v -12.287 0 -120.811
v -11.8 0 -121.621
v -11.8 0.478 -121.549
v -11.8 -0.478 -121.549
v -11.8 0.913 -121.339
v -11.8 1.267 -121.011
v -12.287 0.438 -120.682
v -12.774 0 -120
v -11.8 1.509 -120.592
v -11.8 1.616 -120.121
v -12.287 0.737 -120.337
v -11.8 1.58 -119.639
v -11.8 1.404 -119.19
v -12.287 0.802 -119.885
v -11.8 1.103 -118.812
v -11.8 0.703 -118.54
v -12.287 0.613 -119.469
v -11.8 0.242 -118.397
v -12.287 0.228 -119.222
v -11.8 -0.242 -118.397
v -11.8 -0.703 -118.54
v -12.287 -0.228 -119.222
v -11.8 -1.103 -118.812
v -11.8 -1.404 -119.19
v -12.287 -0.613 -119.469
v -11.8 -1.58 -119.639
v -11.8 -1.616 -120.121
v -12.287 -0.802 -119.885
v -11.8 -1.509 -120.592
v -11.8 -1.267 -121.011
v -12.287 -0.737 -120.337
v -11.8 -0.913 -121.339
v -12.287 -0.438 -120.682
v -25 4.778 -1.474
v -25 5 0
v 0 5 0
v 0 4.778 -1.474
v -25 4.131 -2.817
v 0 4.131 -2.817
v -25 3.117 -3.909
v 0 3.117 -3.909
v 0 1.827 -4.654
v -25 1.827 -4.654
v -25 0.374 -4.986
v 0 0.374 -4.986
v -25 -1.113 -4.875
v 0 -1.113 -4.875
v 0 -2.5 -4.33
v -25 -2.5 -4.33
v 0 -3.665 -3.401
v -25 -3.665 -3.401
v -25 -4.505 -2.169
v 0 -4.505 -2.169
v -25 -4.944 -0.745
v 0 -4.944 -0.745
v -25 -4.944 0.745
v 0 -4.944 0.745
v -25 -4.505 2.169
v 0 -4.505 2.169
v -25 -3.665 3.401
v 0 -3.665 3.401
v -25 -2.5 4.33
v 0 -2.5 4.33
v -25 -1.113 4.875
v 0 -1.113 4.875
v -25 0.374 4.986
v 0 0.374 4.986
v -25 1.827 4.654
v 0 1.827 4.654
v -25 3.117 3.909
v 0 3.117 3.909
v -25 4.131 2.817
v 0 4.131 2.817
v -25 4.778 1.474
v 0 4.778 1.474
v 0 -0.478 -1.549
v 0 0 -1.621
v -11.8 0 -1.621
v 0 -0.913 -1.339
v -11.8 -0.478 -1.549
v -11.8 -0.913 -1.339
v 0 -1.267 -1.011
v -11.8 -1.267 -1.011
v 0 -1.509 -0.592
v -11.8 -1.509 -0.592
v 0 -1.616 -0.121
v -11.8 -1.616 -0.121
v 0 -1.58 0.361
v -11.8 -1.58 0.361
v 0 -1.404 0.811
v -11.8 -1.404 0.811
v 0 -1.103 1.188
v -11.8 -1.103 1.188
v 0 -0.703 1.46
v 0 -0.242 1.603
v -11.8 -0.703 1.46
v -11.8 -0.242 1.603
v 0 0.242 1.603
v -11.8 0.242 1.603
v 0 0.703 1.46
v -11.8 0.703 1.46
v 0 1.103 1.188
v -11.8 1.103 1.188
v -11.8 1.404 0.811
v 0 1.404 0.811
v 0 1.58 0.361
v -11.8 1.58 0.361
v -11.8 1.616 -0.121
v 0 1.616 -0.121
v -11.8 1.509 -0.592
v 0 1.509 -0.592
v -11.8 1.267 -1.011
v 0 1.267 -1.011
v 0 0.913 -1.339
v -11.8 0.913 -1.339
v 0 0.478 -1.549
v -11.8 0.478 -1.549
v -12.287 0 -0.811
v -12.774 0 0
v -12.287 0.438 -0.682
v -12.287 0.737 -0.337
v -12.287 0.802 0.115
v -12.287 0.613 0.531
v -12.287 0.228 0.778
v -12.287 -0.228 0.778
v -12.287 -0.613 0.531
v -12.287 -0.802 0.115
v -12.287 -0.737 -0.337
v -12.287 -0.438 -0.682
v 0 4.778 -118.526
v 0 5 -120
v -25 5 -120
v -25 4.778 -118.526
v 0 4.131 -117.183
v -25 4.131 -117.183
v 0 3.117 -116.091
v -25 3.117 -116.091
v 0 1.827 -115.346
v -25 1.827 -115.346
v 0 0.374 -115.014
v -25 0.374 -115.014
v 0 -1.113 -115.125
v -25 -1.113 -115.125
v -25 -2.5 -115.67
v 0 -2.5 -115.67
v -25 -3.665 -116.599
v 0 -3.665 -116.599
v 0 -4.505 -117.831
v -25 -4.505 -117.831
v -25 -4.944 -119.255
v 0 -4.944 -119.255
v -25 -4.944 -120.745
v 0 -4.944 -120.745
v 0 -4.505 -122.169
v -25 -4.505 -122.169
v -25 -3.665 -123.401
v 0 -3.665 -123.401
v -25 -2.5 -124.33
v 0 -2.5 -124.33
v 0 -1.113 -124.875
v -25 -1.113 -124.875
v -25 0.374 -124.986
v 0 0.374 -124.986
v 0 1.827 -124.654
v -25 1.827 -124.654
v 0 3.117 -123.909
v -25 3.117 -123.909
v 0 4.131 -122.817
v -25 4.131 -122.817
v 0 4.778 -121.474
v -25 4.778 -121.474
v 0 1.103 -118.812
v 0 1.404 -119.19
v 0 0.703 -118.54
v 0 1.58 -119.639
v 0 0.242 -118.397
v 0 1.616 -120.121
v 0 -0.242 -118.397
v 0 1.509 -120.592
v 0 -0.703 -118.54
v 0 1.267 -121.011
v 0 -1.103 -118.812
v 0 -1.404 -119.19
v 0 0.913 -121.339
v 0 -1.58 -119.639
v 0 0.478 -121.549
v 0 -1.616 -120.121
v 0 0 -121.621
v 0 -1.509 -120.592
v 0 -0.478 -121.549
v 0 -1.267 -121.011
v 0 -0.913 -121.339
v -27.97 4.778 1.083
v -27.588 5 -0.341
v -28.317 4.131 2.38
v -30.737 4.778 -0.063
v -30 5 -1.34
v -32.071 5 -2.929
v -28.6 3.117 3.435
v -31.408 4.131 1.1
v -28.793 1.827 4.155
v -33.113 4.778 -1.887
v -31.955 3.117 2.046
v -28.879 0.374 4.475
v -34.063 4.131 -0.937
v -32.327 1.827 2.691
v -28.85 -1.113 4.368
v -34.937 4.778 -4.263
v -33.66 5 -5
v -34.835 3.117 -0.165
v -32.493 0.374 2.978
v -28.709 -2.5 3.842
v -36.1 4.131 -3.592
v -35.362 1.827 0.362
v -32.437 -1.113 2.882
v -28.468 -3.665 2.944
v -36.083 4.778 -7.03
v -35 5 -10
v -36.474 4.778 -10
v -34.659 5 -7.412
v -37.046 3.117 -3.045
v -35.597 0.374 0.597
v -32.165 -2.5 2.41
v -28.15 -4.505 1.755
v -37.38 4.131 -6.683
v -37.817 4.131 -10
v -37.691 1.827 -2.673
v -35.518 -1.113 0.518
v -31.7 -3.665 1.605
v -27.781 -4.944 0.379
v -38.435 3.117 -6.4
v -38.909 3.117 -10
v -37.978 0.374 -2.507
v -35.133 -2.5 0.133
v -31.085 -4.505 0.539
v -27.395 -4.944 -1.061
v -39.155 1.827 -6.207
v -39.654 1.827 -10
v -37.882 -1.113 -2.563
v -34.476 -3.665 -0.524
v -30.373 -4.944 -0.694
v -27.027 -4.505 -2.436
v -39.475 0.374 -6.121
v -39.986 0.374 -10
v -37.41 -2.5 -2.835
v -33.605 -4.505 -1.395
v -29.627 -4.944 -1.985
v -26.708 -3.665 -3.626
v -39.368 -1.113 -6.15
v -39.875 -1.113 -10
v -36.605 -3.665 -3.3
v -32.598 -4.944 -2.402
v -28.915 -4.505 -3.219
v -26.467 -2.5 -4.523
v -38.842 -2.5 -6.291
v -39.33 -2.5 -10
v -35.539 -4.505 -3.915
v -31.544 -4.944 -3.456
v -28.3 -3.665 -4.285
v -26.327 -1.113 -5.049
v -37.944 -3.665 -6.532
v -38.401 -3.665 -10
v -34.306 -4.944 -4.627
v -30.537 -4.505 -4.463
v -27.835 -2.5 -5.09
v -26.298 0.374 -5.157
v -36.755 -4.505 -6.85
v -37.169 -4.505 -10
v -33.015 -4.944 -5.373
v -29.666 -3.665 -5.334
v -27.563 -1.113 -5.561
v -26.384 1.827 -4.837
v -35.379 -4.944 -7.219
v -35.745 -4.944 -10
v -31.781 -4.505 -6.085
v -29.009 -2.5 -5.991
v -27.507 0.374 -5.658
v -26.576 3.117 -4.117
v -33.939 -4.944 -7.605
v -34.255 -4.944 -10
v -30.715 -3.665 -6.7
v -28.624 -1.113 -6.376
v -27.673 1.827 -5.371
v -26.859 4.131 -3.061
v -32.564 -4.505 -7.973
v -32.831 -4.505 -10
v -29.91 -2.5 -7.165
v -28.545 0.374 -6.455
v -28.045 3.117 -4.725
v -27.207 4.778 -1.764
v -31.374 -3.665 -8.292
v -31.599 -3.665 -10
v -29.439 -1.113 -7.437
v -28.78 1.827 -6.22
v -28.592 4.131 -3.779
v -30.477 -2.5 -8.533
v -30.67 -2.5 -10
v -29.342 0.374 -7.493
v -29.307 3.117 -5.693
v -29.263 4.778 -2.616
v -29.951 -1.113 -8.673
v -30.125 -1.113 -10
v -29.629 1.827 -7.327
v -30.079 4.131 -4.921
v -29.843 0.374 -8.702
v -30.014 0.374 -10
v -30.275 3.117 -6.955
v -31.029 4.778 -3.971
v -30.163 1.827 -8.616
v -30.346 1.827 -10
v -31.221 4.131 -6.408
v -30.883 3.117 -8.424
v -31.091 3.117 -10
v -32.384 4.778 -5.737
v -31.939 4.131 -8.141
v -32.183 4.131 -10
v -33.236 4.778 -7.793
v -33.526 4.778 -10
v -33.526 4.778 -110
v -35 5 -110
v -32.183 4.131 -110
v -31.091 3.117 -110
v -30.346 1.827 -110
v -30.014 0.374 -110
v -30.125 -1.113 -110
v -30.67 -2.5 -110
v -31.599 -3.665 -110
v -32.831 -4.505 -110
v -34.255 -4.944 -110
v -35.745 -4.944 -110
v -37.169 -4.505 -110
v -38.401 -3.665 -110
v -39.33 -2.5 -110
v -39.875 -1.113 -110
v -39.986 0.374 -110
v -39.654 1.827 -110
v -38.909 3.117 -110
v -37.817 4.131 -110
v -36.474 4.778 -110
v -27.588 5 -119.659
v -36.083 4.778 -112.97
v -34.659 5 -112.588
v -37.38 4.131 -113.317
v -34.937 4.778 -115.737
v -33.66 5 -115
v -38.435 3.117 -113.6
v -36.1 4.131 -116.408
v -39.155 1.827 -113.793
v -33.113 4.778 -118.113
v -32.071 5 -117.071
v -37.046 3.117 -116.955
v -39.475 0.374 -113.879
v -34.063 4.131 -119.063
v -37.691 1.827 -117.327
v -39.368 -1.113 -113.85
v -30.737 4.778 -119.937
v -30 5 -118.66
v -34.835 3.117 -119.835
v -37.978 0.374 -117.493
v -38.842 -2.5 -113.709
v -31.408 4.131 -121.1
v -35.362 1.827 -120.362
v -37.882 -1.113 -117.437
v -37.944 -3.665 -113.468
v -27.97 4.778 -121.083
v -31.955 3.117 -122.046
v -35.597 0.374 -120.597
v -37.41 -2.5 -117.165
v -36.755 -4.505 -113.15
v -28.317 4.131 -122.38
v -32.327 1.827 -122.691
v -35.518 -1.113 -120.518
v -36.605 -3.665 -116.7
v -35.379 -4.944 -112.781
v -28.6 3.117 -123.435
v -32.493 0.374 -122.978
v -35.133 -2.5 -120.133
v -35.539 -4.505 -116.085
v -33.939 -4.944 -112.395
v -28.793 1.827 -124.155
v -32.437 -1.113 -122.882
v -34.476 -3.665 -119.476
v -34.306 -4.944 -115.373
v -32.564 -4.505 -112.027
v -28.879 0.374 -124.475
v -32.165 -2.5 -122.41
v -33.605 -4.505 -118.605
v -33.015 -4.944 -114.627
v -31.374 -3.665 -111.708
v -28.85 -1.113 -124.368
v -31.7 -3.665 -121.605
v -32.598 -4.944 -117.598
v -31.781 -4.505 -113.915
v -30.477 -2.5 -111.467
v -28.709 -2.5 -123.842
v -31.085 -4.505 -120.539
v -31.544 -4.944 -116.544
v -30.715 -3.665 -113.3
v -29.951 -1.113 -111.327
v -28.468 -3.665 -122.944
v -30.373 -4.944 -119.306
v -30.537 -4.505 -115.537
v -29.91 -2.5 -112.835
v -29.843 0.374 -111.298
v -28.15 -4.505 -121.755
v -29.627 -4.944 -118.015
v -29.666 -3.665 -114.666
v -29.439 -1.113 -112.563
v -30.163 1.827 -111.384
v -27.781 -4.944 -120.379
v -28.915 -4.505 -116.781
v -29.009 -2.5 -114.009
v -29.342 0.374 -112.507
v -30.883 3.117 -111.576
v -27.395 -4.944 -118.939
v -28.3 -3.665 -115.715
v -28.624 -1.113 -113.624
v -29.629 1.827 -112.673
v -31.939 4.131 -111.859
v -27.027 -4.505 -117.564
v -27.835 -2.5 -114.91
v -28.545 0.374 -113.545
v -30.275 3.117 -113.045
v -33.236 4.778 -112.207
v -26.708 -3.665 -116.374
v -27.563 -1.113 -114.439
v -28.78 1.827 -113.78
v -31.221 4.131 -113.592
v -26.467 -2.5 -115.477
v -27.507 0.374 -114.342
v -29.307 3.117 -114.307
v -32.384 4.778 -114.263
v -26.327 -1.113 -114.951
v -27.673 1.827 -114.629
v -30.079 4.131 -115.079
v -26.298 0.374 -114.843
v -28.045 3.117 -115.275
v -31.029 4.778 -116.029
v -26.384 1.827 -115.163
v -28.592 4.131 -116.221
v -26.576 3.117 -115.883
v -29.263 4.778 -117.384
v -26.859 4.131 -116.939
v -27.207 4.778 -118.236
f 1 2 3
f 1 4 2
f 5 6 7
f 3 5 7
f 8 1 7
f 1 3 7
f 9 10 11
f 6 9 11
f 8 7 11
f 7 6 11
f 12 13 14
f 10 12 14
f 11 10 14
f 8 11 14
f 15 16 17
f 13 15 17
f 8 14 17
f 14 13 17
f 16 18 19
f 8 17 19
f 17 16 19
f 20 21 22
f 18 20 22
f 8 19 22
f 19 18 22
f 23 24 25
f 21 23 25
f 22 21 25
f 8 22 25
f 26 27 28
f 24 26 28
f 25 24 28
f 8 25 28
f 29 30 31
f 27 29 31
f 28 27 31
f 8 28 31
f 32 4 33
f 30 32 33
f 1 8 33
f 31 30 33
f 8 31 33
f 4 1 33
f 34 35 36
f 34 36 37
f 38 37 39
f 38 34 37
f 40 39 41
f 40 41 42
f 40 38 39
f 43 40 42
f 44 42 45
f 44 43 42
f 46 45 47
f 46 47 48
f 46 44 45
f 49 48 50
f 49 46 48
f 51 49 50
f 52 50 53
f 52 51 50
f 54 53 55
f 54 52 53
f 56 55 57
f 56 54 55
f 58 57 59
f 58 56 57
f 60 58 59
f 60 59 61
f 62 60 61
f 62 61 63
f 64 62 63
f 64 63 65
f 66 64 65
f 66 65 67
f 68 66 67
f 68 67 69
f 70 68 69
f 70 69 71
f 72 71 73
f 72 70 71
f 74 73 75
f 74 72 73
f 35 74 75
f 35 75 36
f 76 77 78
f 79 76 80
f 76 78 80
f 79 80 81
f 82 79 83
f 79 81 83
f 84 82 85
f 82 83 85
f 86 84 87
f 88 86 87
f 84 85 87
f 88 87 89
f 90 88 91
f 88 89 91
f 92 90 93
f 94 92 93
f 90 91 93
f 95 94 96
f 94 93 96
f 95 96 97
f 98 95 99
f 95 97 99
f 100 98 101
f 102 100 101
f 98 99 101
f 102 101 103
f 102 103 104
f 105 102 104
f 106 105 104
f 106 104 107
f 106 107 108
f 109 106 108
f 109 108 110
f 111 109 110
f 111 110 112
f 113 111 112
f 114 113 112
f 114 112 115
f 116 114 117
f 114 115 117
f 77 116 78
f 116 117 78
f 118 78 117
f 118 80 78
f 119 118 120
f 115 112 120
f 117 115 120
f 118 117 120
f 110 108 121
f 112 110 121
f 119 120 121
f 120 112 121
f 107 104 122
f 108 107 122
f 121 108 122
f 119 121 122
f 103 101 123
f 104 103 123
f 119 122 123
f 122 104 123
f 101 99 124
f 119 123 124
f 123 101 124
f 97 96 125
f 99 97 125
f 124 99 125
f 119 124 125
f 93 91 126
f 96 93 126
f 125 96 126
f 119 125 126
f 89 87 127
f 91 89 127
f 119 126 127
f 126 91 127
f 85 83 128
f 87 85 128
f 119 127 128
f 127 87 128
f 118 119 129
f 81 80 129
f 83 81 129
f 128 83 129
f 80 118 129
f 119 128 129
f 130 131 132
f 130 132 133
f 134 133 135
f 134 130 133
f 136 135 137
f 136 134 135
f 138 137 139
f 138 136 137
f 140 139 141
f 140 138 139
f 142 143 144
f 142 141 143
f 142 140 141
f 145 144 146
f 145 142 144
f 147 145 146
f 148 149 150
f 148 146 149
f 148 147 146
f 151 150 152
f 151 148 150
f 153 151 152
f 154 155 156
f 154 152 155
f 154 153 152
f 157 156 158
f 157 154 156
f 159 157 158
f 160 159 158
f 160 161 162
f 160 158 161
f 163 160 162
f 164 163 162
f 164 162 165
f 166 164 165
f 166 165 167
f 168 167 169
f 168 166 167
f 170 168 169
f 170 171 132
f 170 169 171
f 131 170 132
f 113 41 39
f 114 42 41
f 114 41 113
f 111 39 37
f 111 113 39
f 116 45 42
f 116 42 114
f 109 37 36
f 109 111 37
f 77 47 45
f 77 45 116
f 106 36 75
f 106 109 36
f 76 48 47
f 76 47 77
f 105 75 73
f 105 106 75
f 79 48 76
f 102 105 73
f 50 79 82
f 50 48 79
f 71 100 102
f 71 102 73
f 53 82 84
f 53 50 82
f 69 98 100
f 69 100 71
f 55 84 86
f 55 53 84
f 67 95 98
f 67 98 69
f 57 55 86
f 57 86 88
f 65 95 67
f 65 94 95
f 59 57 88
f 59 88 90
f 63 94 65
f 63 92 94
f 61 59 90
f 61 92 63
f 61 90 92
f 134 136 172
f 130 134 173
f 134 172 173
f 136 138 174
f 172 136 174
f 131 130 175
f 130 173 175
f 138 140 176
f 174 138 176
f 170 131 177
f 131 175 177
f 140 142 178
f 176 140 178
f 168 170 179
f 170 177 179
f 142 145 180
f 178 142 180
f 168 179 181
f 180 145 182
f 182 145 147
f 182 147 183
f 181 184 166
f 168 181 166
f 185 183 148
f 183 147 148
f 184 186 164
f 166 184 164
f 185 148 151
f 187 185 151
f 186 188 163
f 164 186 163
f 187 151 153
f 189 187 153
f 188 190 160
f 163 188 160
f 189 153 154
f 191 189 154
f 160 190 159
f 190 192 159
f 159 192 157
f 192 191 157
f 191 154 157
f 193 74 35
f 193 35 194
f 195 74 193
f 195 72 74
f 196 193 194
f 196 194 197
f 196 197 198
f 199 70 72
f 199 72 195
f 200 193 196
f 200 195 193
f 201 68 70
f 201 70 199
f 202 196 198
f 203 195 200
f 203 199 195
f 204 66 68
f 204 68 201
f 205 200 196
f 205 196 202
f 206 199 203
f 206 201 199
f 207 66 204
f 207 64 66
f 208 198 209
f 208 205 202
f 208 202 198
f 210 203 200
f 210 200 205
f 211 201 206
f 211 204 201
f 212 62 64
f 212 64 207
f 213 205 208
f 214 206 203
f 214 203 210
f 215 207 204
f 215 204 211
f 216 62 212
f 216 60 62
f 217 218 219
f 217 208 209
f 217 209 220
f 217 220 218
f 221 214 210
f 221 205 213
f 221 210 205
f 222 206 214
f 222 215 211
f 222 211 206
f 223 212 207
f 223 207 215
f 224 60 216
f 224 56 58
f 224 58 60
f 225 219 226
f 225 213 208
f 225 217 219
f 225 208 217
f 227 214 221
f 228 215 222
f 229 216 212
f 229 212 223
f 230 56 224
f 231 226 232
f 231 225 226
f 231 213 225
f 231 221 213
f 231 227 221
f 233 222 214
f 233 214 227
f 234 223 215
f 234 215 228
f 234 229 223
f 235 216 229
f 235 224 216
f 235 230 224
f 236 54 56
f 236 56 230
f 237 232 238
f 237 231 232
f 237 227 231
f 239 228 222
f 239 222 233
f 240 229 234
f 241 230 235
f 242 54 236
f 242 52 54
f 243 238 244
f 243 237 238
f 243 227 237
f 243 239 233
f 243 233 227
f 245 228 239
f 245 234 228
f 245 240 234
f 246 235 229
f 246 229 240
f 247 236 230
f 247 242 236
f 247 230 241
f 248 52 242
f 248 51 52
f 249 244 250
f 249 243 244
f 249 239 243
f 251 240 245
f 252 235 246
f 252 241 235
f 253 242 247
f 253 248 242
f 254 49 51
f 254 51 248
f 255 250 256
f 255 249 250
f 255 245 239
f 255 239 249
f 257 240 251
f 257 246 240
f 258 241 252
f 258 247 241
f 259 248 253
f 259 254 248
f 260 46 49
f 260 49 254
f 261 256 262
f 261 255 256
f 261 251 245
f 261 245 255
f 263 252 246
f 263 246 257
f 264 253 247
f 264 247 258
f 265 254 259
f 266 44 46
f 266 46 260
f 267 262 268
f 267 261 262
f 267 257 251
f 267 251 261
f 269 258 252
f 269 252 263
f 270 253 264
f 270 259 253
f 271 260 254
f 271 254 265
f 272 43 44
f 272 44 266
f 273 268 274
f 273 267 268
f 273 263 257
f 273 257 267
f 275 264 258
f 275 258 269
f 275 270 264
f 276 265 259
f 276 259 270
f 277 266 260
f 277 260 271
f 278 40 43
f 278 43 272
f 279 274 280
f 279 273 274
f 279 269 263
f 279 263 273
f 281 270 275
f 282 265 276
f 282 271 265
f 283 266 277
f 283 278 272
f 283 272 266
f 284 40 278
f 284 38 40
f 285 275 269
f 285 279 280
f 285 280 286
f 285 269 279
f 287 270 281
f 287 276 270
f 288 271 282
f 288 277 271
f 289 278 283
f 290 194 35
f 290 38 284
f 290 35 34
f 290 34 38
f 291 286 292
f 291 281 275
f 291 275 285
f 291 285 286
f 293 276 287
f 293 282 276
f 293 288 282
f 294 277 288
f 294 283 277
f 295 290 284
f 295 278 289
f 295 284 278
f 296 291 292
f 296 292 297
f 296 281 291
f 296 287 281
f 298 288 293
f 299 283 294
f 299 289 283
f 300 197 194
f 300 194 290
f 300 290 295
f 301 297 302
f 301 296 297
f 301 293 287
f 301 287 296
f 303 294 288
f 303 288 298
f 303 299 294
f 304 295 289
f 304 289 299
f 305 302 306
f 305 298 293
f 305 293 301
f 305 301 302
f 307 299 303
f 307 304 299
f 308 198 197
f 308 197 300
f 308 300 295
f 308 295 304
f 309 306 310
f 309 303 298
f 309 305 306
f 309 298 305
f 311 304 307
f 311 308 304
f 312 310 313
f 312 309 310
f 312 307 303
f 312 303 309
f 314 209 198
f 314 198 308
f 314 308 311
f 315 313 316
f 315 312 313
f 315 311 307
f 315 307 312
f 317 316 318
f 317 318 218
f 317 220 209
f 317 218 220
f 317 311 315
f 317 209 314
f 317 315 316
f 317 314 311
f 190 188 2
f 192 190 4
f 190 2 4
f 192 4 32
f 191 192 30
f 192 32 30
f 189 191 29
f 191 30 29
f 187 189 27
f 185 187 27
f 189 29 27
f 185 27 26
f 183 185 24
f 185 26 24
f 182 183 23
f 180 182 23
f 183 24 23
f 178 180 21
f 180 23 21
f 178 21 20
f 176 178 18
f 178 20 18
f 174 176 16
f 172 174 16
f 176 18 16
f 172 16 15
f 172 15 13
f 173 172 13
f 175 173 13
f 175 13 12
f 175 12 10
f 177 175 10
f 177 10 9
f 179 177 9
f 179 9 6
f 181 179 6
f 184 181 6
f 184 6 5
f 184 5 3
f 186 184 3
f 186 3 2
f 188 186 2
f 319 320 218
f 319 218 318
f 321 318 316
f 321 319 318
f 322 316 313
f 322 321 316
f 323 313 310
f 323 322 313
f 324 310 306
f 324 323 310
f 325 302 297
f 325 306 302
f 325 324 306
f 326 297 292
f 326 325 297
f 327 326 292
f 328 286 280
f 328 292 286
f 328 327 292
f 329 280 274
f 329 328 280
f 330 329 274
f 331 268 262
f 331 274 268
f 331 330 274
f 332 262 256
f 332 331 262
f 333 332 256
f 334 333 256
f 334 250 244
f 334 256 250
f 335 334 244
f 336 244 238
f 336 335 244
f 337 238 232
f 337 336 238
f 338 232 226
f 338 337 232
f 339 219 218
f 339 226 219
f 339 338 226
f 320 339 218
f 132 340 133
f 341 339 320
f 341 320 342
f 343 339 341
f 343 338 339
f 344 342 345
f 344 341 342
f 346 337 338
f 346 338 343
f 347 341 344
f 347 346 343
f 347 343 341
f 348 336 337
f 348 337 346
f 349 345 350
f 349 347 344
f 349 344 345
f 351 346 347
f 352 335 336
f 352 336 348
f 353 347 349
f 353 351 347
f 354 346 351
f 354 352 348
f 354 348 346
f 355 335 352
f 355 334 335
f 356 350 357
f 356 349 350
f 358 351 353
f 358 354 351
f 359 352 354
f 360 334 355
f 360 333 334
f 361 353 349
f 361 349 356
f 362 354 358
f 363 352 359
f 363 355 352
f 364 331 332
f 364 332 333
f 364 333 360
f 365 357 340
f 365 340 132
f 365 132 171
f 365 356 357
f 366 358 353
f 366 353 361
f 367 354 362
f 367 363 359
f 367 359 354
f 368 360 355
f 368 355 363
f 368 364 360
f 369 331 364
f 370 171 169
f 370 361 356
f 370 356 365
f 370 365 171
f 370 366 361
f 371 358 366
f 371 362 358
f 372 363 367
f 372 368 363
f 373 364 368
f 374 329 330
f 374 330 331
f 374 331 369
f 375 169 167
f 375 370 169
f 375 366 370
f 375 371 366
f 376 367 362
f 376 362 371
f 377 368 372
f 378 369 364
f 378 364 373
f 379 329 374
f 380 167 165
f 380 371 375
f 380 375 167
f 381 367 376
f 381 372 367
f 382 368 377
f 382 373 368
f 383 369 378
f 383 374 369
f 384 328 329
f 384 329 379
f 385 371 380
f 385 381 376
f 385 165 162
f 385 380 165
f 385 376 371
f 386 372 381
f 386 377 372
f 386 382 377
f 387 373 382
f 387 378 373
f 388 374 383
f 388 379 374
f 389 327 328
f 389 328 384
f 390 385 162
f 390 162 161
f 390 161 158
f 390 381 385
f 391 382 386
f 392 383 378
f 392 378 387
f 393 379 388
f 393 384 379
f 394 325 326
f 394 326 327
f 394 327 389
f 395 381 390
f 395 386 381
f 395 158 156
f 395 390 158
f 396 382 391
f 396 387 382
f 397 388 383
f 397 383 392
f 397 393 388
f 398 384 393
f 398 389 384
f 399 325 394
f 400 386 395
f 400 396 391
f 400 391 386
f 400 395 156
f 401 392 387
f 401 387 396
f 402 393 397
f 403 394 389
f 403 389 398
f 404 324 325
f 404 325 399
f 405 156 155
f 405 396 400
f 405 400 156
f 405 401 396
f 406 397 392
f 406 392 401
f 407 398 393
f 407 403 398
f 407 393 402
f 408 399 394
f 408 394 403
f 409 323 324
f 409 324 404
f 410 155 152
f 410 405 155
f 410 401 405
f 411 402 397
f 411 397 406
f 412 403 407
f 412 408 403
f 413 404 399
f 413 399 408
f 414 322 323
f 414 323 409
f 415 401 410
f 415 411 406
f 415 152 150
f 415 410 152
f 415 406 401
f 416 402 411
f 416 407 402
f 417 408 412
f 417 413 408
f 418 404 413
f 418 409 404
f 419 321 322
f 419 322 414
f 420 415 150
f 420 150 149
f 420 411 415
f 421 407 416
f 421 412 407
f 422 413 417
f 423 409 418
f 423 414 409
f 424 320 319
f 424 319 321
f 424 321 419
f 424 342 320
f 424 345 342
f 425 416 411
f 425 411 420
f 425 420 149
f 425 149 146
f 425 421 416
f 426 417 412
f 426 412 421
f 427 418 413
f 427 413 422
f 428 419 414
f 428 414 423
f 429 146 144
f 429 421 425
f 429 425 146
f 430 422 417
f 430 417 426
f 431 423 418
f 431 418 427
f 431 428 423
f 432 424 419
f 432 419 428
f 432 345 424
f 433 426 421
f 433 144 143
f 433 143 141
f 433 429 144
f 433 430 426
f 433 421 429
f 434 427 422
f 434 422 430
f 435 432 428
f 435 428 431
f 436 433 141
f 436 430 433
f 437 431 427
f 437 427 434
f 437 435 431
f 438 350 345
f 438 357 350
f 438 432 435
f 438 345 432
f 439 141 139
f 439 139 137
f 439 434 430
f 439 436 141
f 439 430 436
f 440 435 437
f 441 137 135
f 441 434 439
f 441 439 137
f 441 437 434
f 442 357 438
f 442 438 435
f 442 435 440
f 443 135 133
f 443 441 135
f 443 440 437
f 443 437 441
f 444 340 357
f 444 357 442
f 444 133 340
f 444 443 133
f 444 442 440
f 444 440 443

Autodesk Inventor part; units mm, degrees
ref_plane "YZ Plane" through (0, 0, 0) normal (1, 0, 0) x (0, 1, 0)
ref_plane "XZ Plane" through (0, 0, 0) normal (0, 1, 0) x (-1, 0, 0)
ref_plane "XY Plane" through (0, 0, 0) normal (0, 0, 1) x (1, 0, 0)
sketch "Skizze1" plane through (0, 0, 0) normal (0, 1, 0) x (-1, 0, 0)
  line L0 (0, 0) -> (25, 0)
  line L1 (35, -10) -> (35, -110)
  line L2 (25, -120) -> (0, -120)
  arc A0 (35, -10) -> (25, 0) centre (25, -10) ccw
  arc A1 (25, -120) -> (35, -110) centre (25, -110) ccw
  point P0 (35, 0)
  point P1 (35, -120)
  dimension "d0" = 35
  dimension "d1" = 120
  dimension "d2" = 10
sketch "Skizze2" plane through (0, 0, 0) normal (1, 0, 0) x (0, 1, 0)
  circle A0 centre (0, 0) radius 5
  dimension "d3" = 10
sweep "Sweeping1" add profiles "Skizze2" path "Skizze1"
sketch "Skizze3" plane through (0, 0, 0) normal (1, 0, 0) x (0, 0, -1)
  circle A0 centre (0, 0) radius 5 projected
  point P0 (120, 0)
hole "Bohrung1" at (0, 0, 0) at (0, 0, -120) direction (-1, 0, 0) diameter 3.242 depth 11.8 tip angle 118
properties part number "Blechgriff"
